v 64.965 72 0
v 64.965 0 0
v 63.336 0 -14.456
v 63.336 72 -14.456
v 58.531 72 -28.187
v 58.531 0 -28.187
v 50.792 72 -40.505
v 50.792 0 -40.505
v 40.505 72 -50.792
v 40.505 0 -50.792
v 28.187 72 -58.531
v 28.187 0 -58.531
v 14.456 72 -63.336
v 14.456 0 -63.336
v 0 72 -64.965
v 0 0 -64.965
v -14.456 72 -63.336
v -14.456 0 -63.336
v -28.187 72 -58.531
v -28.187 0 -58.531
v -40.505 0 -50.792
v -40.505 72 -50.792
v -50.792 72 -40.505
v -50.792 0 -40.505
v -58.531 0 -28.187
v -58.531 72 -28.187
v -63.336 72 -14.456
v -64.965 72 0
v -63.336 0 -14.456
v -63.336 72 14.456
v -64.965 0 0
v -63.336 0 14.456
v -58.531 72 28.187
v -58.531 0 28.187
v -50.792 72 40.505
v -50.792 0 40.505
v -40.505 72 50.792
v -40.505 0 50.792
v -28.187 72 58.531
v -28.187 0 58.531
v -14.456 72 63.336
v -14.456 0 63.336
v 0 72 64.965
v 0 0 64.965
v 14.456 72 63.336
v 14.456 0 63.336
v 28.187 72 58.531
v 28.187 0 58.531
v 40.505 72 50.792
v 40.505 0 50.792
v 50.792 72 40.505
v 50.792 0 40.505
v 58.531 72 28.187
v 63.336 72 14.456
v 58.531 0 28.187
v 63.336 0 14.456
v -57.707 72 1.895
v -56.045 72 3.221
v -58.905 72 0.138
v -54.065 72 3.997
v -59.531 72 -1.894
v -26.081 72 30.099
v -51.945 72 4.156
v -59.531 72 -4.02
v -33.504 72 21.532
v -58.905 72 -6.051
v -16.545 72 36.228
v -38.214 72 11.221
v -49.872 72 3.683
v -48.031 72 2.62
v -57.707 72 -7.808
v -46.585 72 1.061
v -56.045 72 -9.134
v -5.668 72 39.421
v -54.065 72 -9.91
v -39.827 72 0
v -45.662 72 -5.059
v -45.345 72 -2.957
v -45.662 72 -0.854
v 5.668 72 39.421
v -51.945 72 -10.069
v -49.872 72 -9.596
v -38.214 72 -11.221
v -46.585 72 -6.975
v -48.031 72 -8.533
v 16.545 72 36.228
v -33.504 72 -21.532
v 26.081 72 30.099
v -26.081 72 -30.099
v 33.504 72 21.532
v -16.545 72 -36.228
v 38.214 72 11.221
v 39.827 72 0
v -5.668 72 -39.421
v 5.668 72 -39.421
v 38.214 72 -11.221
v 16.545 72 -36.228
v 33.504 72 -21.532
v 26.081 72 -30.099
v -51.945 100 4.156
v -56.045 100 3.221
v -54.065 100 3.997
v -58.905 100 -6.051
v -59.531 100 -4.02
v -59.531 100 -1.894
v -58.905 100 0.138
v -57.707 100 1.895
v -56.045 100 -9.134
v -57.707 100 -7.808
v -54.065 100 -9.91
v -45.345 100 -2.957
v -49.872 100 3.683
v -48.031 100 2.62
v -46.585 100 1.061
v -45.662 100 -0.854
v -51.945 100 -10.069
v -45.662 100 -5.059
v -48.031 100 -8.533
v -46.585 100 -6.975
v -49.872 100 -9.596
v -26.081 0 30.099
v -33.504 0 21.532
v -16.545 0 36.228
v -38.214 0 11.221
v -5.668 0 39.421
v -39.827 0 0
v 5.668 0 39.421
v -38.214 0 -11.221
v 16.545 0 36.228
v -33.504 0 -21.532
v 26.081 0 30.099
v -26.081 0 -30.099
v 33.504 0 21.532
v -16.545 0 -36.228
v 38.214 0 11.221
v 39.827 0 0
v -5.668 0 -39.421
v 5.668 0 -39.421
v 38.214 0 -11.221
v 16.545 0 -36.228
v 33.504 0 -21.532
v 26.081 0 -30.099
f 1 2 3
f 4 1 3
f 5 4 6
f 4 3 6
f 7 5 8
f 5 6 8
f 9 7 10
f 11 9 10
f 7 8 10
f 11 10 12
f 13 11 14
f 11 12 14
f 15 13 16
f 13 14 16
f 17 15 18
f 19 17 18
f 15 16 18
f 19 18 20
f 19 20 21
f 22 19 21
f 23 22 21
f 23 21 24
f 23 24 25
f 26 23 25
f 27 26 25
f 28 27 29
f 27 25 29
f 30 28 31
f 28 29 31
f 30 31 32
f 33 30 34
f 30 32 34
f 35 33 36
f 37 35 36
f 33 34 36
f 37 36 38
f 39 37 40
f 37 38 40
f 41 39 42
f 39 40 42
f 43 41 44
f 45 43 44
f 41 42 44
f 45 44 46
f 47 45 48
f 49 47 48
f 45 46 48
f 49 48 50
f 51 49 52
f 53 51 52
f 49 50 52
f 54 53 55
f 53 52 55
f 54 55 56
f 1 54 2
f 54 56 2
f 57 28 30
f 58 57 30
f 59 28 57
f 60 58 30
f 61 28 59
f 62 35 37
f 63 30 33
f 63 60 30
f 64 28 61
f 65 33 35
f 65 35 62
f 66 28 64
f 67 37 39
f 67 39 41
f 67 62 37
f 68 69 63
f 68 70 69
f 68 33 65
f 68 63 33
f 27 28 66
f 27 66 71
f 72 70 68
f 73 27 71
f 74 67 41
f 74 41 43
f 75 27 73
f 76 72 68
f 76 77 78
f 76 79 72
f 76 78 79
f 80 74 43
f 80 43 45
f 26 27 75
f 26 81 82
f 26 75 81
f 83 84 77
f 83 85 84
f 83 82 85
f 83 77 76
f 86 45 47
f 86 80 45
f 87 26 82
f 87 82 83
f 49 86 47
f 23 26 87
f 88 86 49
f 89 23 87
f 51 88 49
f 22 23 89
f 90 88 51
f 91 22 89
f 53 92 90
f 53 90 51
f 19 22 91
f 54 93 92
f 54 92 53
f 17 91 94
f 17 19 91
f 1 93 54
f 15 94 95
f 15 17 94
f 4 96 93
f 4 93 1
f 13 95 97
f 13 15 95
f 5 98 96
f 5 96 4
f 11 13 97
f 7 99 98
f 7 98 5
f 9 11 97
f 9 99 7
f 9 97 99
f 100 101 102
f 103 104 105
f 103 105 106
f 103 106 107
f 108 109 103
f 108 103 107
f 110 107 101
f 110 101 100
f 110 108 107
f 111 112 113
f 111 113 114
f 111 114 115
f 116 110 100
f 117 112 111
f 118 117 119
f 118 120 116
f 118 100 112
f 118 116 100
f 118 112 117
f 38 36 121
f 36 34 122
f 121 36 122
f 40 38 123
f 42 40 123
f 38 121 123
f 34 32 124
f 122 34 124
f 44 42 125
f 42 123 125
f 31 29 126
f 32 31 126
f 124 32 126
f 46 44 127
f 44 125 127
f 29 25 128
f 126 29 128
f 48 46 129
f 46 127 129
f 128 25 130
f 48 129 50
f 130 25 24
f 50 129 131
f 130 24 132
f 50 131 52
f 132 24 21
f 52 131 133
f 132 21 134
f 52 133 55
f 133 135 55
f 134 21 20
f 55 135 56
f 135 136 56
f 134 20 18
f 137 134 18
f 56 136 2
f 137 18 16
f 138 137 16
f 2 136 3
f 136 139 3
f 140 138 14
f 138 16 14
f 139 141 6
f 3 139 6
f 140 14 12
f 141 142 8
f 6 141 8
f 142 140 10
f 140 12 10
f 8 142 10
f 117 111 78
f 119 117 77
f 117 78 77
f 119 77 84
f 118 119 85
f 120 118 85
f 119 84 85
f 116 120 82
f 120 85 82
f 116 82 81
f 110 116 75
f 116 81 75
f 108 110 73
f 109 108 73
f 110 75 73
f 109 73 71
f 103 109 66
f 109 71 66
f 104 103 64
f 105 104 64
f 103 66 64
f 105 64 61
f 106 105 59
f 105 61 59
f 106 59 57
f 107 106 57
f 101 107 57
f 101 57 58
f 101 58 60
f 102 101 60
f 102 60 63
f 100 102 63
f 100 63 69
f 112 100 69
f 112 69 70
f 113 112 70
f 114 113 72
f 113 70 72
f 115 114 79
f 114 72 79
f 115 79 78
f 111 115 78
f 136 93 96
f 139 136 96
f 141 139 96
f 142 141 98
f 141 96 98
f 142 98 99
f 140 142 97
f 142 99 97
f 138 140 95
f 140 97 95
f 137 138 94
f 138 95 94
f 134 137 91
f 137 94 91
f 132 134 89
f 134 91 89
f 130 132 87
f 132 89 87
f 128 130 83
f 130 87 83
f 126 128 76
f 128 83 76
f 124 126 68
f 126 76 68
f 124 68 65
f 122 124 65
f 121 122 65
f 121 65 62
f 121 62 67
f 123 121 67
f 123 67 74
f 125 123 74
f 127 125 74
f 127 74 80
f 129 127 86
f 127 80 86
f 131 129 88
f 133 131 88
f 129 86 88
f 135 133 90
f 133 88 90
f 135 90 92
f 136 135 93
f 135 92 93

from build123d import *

# Parameters (mm, degrees)
SKETCH1_R           = 64.964891119
BOSS_EXTRUDE1_DEPTH = 72
SKETCH2_R           = 39.826869817
CUT_EXTRUDE1_DEPTH  = 72
SKETCH3_R           = 7.132695563
BOSS_EXTRUDE2_DEPTH = 28


with BuildPart() as part:
    # Sketch1 → Boss-Extrude1 (new body)
    with BuildSketch(Plane(origin=(0, 0, 0), x_dir=(1, 0, 0), z_dir=(0, 1, 0))):
        Circle(SKETCH1_R)
    extrude(amount=BOSS_EXTRUDE1_DEPTH)

    # Sketch2 → Cut-Extrude1 (cut)
    with BuildSketch(Plane(origin=(0, 72, 0), x_dir=(1, 0, 0), z_dir=(0, 1, 0))):
        Circle(SKETCH2_R)
    extrude(amount=-CUT_EXTRUDE1_DEPTH, mode=Mode.SUBTRACT)

    # Sketch3 → Boss-Extrude2 (add)
    with BuildSketch(Plane(origin=(0, 72, 0), x_dir=(1, 0, 0), z_dir=(0, 1, 0))):
        with Locations((-52.478167306, 2.956579855)):
            Circle(SKETCH3_R)
    extrude(amount=BOSS_EXTRUDE2_DEPTH)


solid = part.part
